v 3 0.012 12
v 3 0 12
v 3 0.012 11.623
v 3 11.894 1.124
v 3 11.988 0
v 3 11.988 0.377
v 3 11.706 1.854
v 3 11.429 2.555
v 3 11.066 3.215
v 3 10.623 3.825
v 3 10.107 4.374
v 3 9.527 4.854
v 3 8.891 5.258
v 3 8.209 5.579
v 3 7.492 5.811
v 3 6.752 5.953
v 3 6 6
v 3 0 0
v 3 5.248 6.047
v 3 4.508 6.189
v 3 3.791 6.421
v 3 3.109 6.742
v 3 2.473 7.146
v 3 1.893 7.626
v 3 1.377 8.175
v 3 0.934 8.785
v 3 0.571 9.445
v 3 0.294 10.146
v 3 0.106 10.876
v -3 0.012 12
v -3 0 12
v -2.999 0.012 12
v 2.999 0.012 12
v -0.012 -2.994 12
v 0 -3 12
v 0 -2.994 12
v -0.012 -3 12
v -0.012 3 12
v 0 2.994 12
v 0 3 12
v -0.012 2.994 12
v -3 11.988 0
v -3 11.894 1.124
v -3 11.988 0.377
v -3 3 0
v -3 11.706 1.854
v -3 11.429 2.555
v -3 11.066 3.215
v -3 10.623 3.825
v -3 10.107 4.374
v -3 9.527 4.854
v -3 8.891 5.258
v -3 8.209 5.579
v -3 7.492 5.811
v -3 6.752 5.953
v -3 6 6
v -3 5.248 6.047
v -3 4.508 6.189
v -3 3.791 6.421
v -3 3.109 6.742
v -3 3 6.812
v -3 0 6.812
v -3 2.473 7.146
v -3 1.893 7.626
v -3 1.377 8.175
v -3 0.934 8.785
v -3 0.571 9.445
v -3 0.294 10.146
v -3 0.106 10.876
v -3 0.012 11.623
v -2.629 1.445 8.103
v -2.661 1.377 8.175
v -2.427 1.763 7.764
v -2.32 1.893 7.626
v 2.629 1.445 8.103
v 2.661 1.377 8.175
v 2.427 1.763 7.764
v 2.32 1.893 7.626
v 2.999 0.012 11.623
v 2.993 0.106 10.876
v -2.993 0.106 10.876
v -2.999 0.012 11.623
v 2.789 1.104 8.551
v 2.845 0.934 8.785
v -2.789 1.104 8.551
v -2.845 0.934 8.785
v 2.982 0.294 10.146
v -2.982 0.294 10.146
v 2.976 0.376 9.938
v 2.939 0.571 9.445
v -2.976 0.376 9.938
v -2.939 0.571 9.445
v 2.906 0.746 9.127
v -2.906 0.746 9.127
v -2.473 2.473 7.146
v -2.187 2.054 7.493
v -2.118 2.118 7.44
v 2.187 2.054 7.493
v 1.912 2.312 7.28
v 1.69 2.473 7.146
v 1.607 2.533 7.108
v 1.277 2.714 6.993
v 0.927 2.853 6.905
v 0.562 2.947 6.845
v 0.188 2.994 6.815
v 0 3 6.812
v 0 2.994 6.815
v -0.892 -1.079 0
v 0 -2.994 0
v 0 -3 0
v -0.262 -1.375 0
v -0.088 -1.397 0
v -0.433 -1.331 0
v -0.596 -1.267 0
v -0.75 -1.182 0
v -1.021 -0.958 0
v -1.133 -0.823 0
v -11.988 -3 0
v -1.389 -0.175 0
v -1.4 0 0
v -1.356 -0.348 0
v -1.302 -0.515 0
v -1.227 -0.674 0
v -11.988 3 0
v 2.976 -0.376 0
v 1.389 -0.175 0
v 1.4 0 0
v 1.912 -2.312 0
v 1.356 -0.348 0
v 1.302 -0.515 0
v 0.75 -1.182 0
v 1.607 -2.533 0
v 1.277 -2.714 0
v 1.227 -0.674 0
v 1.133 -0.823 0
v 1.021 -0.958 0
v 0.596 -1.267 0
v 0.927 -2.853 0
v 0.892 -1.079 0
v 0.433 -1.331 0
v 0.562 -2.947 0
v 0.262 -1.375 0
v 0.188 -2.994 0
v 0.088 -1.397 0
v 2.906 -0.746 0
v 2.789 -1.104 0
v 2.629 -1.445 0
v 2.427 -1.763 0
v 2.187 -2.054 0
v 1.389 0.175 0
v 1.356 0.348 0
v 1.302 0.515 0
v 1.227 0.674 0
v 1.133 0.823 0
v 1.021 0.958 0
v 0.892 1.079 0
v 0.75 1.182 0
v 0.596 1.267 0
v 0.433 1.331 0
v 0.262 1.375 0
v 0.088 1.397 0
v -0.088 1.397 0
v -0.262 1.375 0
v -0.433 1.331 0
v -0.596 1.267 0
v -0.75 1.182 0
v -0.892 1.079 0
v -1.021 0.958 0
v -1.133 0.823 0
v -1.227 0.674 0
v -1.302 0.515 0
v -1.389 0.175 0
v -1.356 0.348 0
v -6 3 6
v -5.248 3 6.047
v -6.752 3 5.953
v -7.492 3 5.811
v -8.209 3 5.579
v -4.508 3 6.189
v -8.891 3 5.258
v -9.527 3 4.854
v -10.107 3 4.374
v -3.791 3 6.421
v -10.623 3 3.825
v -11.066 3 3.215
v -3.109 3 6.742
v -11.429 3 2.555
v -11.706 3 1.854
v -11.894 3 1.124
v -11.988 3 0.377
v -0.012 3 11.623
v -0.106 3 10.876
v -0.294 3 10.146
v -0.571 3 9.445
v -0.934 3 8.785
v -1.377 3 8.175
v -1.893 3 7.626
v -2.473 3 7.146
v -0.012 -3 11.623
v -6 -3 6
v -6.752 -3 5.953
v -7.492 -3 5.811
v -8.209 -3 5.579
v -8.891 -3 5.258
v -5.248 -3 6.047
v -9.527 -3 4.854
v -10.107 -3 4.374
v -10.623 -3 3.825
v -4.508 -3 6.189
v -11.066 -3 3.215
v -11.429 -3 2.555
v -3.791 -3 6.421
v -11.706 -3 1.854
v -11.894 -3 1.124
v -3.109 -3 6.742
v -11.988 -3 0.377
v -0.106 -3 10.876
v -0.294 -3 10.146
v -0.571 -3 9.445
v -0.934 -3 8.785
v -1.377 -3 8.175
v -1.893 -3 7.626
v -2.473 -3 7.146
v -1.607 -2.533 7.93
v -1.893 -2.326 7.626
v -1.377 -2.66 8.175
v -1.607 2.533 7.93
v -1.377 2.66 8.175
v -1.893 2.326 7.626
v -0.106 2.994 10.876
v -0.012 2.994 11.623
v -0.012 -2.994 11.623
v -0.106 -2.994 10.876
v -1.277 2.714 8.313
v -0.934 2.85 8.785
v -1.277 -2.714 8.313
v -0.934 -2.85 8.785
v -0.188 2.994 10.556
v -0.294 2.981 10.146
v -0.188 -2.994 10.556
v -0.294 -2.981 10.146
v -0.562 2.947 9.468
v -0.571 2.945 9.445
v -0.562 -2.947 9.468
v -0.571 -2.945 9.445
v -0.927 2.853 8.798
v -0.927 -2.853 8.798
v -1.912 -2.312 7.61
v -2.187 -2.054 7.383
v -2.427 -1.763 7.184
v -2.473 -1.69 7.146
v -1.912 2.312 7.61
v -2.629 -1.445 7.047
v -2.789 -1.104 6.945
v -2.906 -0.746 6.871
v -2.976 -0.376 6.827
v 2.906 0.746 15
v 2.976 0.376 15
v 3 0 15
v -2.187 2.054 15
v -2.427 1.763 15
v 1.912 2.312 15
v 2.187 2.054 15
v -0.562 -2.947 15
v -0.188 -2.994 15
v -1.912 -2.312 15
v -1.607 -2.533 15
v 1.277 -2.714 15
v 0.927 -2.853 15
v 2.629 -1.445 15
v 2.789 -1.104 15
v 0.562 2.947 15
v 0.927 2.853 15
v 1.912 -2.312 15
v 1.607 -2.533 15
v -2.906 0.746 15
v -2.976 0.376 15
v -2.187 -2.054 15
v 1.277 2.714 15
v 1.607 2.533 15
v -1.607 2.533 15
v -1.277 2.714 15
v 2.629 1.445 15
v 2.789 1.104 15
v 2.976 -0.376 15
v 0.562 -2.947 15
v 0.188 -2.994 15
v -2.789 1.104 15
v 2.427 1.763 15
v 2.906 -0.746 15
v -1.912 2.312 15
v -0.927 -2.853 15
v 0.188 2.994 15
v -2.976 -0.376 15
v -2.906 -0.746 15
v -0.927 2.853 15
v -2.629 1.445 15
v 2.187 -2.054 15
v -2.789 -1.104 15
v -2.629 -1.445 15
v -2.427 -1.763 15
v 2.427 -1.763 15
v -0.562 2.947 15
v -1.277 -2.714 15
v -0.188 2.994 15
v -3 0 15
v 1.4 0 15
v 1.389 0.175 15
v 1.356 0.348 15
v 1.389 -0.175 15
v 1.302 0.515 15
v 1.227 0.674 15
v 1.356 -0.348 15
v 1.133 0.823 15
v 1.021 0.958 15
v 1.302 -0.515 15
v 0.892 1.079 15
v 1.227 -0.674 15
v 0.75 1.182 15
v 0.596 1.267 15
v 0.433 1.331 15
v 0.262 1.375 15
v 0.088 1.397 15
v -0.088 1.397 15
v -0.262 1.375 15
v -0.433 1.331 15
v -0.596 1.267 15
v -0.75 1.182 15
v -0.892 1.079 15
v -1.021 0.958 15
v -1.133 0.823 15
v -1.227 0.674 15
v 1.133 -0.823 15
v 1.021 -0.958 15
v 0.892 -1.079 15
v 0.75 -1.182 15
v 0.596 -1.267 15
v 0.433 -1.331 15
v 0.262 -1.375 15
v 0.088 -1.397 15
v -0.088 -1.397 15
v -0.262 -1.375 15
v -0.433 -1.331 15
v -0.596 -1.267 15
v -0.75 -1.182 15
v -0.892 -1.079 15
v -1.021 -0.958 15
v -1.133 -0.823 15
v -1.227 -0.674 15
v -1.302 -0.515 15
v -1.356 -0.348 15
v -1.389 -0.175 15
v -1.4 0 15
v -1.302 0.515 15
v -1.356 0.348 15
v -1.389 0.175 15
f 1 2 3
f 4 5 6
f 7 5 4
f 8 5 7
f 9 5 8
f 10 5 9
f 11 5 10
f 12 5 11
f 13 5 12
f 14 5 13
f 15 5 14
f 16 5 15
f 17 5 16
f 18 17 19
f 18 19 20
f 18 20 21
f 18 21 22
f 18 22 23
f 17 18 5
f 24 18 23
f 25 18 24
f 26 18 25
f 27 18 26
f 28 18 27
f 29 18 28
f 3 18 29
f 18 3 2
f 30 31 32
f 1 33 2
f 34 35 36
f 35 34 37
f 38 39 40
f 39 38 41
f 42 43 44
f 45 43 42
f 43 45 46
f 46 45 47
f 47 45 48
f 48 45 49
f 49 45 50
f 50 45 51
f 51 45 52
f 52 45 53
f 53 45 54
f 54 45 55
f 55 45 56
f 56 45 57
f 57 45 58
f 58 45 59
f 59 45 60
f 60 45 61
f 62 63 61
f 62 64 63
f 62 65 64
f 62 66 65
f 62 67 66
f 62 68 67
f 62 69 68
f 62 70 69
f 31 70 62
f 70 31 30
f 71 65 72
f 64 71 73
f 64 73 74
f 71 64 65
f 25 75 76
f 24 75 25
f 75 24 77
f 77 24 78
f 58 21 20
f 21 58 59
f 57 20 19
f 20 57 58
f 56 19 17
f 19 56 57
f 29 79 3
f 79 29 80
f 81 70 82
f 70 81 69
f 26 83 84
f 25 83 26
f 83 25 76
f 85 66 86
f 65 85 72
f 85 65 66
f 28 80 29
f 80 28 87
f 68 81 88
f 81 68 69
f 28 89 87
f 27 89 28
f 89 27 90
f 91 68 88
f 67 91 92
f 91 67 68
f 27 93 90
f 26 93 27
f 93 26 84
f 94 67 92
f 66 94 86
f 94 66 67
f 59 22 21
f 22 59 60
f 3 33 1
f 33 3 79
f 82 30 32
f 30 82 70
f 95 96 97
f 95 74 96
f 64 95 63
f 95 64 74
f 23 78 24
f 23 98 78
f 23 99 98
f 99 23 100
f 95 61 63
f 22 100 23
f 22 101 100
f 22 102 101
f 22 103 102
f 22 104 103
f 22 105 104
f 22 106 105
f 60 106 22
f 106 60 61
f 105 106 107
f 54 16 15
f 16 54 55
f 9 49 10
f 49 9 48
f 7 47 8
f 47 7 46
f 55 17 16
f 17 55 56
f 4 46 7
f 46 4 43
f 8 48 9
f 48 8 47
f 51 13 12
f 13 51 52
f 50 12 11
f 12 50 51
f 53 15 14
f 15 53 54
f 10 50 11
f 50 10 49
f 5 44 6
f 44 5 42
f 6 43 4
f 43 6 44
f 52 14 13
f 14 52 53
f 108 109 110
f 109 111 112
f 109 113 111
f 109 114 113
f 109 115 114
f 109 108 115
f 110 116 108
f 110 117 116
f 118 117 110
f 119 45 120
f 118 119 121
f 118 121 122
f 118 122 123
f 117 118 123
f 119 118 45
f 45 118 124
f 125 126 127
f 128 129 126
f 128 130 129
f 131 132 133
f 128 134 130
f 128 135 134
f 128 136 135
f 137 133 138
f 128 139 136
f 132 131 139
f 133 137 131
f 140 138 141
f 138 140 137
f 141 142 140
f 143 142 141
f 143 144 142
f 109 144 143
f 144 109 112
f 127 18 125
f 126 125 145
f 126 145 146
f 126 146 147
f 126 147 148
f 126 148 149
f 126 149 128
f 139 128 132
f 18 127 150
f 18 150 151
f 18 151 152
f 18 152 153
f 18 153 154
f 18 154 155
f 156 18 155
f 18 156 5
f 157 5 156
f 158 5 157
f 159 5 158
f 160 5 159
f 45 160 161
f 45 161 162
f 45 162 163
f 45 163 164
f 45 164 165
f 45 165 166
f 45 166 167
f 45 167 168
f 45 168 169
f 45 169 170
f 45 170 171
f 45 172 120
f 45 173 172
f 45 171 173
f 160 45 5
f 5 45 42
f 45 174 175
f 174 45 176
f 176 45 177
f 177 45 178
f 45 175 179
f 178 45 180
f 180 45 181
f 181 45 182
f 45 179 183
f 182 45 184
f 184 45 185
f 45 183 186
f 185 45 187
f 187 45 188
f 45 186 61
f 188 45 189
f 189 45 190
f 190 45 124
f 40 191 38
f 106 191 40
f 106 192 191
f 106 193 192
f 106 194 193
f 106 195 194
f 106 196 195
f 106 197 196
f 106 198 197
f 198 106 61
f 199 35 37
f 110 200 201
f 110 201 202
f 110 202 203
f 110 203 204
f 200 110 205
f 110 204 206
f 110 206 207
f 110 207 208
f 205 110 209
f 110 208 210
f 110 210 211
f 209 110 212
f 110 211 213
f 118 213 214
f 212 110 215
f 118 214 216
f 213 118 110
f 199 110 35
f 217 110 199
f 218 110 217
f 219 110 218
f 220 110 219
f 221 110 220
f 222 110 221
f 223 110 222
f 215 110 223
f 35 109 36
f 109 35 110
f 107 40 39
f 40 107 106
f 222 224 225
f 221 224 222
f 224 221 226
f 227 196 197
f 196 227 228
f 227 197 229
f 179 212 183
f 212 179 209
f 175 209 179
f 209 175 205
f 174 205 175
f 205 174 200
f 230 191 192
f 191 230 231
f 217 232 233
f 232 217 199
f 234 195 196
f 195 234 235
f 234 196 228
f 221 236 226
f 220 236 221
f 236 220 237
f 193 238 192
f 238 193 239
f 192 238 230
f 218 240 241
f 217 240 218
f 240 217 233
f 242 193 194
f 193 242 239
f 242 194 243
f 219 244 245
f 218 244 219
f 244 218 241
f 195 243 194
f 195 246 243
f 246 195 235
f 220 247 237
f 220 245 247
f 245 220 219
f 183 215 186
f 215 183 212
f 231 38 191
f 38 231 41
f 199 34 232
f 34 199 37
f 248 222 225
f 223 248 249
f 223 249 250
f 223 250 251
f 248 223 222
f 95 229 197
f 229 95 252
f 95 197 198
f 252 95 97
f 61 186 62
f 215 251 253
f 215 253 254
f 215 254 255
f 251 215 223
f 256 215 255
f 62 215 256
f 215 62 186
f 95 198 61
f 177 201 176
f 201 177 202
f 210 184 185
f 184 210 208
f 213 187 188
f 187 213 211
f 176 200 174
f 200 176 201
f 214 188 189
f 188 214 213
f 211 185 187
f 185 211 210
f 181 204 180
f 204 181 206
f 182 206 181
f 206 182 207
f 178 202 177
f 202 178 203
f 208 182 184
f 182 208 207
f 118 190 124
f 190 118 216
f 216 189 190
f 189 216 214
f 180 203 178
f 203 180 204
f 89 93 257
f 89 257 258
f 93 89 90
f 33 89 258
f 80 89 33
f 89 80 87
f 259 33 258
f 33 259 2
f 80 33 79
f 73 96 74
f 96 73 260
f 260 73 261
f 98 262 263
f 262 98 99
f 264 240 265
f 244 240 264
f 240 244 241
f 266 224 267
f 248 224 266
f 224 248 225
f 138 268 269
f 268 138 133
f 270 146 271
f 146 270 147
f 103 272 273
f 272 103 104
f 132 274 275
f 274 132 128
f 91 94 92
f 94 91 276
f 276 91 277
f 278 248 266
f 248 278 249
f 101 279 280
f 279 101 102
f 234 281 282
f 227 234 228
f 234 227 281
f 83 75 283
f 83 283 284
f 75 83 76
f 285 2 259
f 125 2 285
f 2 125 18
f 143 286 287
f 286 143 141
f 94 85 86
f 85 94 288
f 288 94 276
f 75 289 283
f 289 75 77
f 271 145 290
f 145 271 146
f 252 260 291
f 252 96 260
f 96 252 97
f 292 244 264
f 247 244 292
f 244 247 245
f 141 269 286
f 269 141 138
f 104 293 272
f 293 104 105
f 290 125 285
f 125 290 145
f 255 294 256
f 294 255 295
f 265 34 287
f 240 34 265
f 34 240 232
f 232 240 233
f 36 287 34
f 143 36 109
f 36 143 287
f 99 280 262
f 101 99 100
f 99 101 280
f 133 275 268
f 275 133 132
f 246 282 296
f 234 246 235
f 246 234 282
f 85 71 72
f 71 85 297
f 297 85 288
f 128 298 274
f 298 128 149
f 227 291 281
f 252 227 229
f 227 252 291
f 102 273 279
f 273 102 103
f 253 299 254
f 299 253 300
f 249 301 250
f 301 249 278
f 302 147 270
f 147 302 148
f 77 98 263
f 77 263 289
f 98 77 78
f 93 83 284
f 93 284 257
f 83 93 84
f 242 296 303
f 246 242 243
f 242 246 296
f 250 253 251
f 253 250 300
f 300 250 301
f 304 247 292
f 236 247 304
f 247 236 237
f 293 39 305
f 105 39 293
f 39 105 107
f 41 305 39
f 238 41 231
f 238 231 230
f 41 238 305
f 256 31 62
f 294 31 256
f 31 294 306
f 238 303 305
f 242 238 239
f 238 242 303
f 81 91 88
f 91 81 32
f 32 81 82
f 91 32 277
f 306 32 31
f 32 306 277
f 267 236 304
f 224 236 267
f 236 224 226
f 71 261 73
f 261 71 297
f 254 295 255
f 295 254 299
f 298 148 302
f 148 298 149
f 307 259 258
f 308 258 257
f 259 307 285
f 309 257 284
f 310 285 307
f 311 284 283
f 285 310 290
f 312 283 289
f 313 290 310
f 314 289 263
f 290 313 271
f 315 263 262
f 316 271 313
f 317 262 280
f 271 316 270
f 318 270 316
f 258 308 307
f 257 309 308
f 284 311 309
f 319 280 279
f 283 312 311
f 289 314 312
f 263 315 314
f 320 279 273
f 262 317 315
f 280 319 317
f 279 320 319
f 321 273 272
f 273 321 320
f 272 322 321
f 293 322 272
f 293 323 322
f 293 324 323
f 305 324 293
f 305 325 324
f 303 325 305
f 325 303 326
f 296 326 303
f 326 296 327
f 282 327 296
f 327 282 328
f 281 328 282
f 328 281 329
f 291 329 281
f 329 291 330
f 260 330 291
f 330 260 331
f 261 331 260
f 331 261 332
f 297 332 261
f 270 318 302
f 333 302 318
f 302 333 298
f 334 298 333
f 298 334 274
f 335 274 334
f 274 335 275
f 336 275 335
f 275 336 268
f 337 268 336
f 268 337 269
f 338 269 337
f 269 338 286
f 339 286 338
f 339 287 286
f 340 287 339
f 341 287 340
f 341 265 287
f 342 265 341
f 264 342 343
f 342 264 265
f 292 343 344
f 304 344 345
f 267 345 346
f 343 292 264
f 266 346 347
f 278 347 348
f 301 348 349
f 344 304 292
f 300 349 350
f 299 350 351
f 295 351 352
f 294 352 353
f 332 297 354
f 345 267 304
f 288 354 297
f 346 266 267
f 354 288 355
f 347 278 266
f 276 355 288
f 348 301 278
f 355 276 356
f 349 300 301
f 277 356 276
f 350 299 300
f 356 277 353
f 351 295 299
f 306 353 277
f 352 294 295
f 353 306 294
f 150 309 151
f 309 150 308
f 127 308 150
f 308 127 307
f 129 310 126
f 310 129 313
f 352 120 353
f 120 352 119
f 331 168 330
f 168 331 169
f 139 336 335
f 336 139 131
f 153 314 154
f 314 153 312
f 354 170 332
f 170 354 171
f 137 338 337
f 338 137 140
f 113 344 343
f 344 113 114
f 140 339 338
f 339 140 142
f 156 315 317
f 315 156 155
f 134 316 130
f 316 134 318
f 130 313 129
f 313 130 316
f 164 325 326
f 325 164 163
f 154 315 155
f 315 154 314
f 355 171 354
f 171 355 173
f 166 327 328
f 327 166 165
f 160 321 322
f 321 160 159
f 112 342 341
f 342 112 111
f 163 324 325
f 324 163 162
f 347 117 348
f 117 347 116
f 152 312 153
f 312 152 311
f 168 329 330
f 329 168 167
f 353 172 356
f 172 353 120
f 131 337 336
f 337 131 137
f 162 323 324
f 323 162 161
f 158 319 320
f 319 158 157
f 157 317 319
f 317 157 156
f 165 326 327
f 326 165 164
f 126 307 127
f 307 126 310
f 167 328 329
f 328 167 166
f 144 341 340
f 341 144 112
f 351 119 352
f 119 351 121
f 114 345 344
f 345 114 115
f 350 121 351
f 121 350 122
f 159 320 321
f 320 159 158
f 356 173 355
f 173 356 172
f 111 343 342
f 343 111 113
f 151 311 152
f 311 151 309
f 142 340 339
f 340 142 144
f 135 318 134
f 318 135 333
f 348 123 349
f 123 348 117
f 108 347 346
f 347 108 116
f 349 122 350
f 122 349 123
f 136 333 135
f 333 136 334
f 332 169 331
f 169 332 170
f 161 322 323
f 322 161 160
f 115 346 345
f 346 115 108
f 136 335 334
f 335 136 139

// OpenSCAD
$fn = 50;

//hole radius
hr = 1.4;

//height
h = 15;

//strength
s = 6;

// length of foots
l = 12;

assert(s*2 <=l);


module leg(){
    translate([-s/2,0,0]) union() {
        translate([0,0,s]) difference() {
            cube([s,s,s]);
            translate([0,s,s]) rotate([0,90,0])cylinder(s,s,s);
        }

        cube([s,l-s,s]);

        intersection() {
        translate([0,l-s,0]) rotate([0,90,0]) cylinder(s,s,s);
        translate([0,0,0]) cube([s,l,s*2]);
        }
    }
}

difference() {
    union() {
        cylinder(h,s/2,s/2);
        leg();
        rotate([0,0,90]) leg();
        // rotate([0,0,180]) leg();
        // rotate([0,0,270]) leg();    
    }
    cylinder(h,hr,hr);

}
